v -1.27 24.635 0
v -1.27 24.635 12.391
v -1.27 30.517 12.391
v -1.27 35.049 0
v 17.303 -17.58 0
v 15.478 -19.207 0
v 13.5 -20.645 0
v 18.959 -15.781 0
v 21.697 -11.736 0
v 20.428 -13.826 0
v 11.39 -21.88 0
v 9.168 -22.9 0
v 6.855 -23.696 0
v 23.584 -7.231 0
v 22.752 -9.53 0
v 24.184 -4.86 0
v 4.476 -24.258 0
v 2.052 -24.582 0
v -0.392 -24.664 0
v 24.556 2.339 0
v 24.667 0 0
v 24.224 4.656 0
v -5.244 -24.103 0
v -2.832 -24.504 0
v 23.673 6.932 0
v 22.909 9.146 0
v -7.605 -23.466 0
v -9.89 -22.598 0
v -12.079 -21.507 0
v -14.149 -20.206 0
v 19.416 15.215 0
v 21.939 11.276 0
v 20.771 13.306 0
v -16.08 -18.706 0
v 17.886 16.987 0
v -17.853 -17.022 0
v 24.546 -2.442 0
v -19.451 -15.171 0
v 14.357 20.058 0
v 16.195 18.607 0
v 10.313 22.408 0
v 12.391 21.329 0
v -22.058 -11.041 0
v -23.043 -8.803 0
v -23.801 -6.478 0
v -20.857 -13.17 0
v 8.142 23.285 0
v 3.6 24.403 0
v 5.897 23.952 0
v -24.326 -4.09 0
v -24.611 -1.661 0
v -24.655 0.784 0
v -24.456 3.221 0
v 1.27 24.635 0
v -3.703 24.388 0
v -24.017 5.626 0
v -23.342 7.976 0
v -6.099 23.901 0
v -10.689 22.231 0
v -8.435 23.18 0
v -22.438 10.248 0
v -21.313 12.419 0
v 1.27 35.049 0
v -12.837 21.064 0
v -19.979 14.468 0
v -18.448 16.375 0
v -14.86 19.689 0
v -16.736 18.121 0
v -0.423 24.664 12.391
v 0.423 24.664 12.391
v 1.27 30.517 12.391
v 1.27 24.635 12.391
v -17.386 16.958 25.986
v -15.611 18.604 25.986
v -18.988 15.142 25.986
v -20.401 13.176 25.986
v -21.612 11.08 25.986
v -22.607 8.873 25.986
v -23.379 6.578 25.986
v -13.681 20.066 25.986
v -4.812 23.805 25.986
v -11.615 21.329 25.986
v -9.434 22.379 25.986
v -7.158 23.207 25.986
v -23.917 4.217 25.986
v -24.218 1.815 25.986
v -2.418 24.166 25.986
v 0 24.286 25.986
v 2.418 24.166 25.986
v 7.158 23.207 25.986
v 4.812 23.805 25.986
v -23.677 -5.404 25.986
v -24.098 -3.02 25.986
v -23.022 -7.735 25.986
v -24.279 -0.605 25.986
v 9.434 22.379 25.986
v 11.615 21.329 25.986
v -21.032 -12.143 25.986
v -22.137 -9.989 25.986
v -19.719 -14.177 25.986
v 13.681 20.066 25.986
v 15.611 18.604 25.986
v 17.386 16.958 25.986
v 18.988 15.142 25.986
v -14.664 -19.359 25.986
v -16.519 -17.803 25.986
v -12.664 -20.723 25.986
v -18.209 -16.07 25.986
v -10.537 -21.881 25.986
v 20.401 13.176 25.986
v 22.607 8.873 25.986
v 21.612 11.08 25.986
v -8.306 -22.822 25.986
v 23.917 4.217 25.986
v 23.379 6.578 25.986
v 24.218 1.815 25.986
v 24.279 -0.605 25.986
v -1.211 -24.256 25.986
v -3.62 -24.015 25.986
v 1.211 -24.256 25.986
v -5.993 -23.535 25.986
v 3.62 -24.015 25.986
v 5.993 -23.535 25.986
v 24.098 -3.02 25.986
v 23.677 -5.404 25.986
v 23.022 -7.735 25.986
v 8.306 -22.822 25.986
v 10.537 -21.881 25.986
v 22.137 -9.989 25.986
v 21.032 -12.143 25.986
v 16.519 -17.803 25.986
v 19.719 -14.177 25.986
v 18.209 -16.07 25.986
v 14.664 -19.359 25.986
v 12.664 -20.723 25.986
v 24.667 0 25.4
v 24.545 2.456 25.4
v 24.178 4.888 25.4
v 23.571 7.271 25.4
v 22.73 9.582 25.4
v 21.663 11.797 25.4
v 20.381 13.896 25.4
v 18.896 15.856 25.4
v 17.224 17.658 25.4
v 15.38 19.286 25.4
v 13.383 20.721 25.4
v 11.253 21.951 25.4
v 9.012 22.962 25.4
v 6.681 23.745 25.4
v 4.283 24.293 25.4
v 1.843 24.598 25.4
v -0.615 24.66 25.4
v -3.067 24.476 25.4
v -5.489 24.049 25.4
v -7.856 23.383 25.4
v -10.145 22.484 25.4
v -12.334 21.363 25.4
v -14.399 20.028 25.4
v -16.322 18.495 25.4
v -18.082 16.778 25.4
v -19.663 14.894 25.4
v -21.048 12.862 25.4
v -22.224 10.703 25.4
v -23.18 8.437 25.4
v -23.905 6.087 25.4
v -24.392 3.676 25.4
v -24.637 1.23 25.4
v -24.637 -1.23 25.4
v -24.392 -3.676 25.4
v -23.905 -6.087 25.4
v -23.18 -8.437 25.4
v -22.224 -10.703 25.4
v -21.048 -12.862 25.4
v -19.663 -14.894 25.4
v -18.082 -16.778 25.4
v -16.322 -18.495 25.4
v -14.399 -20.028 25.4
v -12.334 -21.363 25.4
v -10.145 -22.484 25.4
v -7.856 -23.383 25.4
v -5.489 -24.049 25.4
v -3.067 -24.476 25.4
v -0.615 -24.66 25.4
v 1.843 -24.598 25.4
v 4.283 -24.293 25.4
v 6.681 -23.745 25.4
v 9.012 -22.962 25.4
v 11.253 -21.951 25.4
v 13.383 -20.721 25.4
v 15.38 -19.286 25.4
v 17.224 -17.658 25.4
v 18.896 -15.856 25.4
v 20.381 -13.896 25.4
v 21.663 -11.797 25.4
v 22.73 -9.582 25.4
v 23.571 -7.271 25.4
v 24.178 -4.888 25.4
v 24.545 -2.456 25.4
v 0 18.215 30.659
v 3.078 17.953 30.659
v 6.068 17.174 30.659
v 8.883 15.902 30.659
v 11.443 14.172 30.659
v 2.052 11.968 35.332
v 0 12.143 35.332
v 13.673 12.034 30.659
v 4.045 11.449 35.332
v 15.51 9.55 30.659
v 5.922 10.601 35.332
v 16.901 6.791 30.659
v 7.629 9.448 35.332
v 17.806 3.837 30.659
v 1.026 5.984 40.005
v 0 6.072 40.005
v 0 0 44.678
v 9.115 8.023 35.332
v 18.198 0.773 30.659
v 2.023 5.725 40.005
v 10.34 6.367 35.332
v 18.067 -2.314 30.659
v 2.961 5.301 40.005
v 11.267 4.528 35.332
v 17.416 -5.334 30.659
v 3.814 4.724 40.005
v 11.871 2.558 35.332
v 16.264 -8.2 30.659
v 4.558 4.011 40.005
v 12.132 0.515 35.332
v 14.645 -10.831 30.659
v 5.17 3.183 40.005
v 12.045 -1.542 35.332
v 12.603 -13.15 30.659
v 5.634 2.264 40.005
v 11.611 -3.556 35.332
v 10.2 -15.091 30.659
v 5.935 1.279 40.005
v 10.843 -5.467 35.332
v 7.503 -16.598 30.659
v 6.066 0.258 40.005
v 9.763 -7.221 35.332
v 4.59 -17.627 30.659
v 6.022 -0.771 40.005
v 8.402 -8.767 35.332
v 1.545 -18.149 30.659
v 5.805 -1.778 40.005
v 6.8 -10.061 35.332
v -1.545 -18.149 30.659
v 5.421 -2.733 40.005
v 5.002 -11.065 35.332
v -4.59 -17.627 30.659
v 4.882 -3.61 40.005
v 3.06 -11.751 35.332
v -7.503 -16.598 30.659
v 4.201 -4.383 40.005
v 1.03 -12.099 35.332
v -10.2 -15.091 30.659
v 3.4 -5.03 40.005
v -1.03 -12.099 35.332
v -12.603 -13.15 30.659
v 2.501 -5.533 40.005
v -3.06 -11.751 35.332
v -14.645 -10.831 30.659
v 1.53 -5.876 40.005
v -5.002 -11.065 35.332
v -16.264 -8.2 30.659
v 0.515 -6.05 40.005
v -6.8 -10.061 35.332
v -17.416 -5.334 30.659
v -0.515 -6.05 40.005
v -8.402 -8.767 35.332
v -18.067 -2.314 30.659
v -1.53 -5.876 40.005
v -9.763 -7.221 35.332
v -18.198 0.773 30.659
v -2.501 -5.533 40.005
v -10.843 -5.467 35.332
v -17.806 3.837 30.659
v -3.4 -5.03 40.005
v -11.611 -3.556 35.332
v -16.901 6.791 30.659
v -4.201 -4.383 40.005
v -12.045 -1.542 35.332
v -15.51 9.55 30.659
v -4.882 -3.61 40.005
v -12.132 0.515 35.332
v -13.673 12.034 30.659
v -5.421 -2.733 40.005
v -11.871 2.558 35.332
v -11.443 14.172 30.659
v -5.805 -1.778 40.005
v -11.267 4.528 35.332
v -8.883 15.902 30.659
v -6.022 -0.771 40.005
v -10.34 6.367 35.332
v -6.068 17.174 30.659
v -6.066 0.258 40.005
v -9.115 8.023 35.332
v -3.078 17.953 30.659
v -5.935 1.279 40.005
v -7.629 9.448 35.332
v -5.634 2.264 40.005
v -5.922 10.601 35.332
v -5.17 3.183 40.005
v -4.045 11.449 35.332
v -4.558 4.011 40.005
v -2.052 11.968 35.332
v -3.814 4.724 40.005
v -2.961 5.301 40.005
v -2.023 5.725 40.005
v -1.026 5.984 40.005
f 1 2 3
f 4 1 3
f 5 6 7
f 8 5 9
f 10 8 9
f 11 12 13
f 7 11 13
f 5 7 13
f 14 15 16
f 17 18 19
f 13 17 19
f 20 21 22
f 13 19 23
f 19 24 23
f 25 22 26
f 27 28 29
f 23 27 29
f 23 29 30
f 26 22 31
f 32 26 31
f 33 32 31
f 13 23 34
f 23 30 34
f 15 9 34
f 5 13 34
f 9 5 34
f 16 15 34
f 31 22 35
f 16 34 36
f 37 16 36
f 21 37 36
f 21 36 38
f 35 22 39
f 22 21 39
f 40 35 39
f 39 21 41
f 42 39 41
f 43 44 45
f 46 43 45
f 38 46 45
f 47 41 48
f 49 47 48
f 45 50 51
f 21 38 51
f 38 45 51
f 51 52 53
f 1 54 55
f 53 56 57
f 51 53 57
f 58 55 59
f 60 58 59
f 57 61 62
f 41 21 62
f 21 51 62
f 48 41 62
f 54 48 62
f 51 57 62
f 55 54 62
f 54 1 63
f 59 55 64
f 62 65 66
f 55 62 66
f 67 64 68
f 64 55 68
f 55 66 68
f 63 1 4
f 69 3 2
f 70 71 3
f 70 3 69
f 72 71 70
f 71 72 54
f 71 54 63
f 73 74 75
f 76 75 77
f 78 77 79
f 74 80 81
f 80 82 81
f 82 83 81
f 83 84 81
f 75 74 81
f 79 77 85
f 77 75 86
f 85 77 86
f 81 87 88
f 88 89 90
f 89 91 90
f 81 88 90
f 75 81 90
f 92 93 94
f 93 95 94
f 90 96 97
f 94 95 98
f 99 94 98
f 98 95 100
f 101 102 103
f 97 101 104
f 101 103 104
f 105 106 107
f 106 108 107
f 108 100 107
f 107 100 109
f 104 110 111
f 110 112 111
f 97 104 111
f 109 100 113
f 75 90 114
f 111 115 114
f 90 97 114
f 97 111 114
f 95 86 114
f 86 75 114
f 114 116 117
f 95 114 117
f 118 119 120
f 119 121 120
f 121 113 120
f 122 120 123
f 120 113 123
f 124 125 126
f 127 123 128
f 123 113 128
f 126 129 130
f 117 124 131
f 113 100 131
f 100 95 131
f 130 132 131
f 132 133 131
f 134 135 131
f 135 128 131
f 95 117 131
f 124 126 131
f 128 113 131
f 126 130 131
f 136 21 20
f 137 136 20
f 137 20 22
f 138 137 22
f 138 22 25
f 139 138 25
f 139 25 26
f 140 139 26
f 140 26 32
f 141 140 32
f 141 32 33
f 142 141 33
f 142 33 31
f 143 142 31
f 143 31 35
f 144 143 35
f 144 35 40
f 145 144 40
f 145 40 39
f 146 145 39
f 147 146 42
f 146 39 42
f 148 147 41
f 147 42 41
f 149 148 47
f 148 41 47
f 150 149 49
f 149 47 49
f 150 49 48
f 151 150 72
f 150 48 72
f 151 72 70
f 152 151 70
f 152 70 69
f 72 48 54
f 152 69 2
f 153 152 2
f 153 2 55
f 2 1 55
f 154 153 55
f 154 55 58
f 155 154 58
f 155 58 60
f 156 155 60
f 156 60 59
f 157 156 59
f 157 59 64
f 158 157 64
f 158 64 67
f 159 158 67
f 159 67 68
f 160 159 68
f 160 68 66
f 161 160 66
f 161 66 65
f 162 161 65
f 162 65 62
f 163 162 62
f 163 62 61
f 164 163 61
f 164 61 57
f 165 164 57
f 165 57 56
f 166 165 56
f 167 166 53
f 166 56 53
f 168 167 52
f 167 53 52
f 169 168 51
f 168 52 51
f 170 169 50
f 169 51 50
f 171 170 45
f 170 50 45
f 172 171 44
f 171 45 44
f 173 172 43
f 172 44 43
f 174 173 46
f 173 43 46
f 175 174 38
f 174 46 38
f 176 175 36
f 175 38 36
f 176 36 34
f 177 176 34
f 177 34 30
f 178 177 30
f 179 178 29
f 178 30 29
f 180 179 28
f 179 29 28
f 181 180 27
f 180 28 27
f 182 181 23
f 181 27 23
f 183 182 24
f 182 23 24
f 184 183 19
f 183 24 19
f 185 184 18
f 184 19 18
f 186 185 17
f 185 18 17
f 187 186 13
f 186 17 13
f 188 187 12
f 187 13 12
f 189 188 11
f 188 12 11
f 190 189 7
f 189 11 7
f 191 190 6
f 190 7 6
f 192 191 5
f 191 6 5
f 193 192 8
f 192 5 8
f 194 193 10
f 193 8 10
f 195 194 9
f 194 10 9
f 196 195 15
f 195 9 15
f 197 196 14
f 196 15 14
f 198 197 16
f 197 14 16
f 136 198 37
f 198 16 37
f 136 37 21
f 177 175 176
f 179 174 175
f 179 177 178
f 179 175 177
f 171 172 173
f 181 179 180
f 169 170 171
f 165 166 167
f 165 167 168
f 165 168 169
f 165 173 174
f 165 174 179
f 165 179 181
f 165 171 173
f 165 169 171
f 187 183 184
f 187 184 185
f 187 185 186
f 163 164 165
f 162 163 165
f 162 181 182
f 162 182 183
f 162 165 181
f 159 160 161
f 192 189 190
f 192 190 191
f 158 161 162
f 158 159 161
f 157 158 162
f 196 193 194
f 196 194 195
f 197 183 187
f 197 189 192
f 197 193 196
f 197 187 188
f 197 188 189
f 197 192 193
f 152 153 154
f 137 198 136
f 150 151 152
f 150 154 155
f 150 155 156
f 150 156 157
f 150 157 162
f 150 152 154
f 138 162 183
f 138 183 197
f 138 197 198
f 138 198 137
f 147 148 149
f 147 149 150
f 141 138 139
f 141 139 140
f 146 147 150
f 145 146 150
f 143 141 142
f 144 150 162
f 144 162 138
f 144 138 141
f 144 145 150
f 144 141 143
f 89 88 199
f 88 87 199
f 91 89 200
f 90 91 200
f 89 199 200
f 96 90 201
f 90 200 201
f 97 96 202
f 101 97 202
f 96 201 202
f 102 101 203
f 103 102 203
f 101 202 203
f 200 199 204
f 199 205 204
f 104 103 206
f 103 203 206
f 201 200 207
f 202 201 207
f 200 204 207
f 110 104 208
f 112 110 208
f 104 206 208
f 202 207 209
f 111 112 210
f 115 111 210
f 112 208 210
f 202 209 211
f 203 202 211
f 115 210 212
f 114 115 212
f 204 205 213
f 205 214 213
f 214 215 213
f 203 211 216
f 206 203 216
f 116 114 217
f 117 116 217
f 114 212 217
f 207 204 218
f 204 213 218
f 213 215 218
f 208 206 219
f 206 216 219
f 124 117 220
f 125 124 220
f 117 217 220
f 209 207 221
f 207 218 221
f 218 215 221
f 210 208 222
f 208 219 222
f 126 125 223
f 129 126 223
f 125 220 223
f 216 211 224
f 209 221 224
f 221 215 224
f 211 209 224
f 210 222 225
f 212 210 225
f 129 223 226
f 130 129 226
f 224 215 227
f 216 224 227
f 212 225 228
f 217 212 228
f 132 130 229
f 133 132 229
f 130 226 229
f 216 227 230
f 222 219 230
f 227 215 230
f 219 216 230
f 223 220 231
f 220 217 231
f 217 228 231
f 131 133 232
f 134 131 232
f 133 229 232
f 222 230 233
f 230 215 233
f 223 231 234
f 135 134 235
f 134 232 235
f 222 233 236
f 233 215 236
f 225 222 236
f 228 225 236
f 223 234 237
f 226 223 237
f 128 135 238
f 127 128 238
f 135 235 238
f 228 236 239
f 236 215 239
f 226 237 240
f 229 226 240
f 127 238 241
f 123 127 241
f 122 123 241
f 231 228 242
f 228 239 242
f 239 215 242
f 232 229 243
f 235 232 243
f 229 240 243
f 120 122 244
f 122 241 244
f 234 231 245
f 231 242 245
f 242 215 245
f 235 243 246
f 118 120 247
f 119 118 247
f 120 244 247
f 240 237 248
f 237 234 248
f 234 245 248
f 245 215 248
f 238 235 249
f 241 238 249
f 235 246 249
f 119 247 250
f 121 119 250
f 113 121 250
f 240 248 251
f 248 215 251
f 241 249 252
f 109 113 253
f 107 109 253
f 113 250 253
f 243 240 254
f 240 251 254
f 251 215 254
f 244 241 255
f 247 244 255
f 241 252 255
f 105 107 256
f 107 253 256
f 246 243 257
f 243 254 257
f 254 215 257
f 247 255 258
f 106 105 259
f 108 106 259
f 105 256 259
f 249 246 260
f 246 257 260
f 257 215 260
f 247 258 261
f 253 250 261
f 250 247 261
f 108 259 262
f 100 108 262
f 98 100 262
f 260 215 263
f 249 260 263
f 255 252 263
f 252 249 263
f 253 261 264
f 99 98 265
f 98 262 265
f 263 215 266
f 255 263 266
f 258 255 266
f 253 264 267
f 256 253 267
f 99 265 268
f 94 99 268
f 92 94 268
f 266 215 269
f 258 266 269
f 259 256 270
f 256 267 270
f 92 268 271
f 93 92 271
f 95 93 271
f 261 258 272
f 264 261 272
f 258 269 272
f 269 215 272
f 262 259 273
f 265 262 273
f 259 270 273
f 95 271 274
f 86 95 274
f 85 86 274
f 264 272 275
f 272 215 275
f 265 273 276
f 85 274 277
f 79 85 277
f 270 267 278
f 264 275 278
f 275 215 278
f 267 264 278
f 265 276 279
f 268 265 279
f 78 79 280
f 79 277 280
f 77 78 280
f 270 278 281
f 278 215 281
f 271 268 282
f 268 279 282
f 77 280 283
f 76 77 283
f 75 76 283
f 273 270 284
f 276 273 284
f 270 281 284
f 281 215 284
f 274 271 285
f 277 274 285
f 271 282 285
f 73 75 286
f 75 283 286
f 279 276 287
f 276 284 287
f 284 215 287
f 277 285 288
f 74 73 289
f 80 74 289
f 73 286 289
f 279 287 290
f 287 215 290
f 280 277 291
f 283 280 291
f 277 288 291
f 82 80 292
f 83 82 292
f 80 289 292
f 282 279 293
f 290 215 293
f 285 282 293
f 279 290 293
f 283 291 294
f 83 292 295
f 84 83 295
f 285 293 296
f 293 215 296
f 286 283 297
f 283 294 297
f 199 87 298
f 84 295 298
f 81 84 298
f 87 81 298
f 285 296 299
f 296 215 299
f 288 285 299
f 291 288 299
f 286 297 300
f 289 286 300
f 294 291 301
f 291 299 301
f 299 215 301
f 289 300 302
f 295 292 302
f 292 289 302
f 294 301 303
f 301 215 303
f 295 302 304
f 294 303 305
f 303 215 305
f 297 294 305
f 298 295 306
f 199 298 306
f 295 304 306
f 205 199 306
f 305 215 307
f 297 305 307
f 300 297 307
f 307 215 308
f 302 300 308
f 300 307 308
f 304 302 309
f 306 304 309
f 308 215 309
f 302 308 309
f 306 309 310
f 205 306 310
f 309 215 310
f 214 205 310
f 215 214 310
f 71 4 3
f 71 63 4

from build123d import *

# Parameters (mm, degrees)
F0_R          = 24.667295
F1_DEPTH      = 25.4
F5_DEPTH      = 1.27
F5_DEPTH_BACK = 1.27


with BuildPart() as f1:
    # F0 (on Top) → F1 (new body)
    with BuildSketch(Plane.XY):
        Circle(F0_R)
    extrude(amount=F1_DEPTH)

    # F4 (on Right) → F5 (join, two sides)
    with BuildSketch(Plane.YZ) as f5_sk:
        Polygon((30.517086, 12.39093), (0, 12.39093), (0, 0), (35.04863, 0), align=None)
    extrude(amount=F5_DEPTH)
    extrude(f5_sk.sketch, amount=-F5_DEPTH_BACK)


with BuildPart() as f3:
    # F2 (on Right) → F3 (revolve)
    with BuildSketch(Plane.YZ):
        Polygon((24.286222, 25.98555), (0, 44.678152), (0, 25.98555), align=None)
    revolve(axis=Axis((0, 0, 35.331851), (0, 0, -1)))


solid = Compound([f1.part, f3.part])
